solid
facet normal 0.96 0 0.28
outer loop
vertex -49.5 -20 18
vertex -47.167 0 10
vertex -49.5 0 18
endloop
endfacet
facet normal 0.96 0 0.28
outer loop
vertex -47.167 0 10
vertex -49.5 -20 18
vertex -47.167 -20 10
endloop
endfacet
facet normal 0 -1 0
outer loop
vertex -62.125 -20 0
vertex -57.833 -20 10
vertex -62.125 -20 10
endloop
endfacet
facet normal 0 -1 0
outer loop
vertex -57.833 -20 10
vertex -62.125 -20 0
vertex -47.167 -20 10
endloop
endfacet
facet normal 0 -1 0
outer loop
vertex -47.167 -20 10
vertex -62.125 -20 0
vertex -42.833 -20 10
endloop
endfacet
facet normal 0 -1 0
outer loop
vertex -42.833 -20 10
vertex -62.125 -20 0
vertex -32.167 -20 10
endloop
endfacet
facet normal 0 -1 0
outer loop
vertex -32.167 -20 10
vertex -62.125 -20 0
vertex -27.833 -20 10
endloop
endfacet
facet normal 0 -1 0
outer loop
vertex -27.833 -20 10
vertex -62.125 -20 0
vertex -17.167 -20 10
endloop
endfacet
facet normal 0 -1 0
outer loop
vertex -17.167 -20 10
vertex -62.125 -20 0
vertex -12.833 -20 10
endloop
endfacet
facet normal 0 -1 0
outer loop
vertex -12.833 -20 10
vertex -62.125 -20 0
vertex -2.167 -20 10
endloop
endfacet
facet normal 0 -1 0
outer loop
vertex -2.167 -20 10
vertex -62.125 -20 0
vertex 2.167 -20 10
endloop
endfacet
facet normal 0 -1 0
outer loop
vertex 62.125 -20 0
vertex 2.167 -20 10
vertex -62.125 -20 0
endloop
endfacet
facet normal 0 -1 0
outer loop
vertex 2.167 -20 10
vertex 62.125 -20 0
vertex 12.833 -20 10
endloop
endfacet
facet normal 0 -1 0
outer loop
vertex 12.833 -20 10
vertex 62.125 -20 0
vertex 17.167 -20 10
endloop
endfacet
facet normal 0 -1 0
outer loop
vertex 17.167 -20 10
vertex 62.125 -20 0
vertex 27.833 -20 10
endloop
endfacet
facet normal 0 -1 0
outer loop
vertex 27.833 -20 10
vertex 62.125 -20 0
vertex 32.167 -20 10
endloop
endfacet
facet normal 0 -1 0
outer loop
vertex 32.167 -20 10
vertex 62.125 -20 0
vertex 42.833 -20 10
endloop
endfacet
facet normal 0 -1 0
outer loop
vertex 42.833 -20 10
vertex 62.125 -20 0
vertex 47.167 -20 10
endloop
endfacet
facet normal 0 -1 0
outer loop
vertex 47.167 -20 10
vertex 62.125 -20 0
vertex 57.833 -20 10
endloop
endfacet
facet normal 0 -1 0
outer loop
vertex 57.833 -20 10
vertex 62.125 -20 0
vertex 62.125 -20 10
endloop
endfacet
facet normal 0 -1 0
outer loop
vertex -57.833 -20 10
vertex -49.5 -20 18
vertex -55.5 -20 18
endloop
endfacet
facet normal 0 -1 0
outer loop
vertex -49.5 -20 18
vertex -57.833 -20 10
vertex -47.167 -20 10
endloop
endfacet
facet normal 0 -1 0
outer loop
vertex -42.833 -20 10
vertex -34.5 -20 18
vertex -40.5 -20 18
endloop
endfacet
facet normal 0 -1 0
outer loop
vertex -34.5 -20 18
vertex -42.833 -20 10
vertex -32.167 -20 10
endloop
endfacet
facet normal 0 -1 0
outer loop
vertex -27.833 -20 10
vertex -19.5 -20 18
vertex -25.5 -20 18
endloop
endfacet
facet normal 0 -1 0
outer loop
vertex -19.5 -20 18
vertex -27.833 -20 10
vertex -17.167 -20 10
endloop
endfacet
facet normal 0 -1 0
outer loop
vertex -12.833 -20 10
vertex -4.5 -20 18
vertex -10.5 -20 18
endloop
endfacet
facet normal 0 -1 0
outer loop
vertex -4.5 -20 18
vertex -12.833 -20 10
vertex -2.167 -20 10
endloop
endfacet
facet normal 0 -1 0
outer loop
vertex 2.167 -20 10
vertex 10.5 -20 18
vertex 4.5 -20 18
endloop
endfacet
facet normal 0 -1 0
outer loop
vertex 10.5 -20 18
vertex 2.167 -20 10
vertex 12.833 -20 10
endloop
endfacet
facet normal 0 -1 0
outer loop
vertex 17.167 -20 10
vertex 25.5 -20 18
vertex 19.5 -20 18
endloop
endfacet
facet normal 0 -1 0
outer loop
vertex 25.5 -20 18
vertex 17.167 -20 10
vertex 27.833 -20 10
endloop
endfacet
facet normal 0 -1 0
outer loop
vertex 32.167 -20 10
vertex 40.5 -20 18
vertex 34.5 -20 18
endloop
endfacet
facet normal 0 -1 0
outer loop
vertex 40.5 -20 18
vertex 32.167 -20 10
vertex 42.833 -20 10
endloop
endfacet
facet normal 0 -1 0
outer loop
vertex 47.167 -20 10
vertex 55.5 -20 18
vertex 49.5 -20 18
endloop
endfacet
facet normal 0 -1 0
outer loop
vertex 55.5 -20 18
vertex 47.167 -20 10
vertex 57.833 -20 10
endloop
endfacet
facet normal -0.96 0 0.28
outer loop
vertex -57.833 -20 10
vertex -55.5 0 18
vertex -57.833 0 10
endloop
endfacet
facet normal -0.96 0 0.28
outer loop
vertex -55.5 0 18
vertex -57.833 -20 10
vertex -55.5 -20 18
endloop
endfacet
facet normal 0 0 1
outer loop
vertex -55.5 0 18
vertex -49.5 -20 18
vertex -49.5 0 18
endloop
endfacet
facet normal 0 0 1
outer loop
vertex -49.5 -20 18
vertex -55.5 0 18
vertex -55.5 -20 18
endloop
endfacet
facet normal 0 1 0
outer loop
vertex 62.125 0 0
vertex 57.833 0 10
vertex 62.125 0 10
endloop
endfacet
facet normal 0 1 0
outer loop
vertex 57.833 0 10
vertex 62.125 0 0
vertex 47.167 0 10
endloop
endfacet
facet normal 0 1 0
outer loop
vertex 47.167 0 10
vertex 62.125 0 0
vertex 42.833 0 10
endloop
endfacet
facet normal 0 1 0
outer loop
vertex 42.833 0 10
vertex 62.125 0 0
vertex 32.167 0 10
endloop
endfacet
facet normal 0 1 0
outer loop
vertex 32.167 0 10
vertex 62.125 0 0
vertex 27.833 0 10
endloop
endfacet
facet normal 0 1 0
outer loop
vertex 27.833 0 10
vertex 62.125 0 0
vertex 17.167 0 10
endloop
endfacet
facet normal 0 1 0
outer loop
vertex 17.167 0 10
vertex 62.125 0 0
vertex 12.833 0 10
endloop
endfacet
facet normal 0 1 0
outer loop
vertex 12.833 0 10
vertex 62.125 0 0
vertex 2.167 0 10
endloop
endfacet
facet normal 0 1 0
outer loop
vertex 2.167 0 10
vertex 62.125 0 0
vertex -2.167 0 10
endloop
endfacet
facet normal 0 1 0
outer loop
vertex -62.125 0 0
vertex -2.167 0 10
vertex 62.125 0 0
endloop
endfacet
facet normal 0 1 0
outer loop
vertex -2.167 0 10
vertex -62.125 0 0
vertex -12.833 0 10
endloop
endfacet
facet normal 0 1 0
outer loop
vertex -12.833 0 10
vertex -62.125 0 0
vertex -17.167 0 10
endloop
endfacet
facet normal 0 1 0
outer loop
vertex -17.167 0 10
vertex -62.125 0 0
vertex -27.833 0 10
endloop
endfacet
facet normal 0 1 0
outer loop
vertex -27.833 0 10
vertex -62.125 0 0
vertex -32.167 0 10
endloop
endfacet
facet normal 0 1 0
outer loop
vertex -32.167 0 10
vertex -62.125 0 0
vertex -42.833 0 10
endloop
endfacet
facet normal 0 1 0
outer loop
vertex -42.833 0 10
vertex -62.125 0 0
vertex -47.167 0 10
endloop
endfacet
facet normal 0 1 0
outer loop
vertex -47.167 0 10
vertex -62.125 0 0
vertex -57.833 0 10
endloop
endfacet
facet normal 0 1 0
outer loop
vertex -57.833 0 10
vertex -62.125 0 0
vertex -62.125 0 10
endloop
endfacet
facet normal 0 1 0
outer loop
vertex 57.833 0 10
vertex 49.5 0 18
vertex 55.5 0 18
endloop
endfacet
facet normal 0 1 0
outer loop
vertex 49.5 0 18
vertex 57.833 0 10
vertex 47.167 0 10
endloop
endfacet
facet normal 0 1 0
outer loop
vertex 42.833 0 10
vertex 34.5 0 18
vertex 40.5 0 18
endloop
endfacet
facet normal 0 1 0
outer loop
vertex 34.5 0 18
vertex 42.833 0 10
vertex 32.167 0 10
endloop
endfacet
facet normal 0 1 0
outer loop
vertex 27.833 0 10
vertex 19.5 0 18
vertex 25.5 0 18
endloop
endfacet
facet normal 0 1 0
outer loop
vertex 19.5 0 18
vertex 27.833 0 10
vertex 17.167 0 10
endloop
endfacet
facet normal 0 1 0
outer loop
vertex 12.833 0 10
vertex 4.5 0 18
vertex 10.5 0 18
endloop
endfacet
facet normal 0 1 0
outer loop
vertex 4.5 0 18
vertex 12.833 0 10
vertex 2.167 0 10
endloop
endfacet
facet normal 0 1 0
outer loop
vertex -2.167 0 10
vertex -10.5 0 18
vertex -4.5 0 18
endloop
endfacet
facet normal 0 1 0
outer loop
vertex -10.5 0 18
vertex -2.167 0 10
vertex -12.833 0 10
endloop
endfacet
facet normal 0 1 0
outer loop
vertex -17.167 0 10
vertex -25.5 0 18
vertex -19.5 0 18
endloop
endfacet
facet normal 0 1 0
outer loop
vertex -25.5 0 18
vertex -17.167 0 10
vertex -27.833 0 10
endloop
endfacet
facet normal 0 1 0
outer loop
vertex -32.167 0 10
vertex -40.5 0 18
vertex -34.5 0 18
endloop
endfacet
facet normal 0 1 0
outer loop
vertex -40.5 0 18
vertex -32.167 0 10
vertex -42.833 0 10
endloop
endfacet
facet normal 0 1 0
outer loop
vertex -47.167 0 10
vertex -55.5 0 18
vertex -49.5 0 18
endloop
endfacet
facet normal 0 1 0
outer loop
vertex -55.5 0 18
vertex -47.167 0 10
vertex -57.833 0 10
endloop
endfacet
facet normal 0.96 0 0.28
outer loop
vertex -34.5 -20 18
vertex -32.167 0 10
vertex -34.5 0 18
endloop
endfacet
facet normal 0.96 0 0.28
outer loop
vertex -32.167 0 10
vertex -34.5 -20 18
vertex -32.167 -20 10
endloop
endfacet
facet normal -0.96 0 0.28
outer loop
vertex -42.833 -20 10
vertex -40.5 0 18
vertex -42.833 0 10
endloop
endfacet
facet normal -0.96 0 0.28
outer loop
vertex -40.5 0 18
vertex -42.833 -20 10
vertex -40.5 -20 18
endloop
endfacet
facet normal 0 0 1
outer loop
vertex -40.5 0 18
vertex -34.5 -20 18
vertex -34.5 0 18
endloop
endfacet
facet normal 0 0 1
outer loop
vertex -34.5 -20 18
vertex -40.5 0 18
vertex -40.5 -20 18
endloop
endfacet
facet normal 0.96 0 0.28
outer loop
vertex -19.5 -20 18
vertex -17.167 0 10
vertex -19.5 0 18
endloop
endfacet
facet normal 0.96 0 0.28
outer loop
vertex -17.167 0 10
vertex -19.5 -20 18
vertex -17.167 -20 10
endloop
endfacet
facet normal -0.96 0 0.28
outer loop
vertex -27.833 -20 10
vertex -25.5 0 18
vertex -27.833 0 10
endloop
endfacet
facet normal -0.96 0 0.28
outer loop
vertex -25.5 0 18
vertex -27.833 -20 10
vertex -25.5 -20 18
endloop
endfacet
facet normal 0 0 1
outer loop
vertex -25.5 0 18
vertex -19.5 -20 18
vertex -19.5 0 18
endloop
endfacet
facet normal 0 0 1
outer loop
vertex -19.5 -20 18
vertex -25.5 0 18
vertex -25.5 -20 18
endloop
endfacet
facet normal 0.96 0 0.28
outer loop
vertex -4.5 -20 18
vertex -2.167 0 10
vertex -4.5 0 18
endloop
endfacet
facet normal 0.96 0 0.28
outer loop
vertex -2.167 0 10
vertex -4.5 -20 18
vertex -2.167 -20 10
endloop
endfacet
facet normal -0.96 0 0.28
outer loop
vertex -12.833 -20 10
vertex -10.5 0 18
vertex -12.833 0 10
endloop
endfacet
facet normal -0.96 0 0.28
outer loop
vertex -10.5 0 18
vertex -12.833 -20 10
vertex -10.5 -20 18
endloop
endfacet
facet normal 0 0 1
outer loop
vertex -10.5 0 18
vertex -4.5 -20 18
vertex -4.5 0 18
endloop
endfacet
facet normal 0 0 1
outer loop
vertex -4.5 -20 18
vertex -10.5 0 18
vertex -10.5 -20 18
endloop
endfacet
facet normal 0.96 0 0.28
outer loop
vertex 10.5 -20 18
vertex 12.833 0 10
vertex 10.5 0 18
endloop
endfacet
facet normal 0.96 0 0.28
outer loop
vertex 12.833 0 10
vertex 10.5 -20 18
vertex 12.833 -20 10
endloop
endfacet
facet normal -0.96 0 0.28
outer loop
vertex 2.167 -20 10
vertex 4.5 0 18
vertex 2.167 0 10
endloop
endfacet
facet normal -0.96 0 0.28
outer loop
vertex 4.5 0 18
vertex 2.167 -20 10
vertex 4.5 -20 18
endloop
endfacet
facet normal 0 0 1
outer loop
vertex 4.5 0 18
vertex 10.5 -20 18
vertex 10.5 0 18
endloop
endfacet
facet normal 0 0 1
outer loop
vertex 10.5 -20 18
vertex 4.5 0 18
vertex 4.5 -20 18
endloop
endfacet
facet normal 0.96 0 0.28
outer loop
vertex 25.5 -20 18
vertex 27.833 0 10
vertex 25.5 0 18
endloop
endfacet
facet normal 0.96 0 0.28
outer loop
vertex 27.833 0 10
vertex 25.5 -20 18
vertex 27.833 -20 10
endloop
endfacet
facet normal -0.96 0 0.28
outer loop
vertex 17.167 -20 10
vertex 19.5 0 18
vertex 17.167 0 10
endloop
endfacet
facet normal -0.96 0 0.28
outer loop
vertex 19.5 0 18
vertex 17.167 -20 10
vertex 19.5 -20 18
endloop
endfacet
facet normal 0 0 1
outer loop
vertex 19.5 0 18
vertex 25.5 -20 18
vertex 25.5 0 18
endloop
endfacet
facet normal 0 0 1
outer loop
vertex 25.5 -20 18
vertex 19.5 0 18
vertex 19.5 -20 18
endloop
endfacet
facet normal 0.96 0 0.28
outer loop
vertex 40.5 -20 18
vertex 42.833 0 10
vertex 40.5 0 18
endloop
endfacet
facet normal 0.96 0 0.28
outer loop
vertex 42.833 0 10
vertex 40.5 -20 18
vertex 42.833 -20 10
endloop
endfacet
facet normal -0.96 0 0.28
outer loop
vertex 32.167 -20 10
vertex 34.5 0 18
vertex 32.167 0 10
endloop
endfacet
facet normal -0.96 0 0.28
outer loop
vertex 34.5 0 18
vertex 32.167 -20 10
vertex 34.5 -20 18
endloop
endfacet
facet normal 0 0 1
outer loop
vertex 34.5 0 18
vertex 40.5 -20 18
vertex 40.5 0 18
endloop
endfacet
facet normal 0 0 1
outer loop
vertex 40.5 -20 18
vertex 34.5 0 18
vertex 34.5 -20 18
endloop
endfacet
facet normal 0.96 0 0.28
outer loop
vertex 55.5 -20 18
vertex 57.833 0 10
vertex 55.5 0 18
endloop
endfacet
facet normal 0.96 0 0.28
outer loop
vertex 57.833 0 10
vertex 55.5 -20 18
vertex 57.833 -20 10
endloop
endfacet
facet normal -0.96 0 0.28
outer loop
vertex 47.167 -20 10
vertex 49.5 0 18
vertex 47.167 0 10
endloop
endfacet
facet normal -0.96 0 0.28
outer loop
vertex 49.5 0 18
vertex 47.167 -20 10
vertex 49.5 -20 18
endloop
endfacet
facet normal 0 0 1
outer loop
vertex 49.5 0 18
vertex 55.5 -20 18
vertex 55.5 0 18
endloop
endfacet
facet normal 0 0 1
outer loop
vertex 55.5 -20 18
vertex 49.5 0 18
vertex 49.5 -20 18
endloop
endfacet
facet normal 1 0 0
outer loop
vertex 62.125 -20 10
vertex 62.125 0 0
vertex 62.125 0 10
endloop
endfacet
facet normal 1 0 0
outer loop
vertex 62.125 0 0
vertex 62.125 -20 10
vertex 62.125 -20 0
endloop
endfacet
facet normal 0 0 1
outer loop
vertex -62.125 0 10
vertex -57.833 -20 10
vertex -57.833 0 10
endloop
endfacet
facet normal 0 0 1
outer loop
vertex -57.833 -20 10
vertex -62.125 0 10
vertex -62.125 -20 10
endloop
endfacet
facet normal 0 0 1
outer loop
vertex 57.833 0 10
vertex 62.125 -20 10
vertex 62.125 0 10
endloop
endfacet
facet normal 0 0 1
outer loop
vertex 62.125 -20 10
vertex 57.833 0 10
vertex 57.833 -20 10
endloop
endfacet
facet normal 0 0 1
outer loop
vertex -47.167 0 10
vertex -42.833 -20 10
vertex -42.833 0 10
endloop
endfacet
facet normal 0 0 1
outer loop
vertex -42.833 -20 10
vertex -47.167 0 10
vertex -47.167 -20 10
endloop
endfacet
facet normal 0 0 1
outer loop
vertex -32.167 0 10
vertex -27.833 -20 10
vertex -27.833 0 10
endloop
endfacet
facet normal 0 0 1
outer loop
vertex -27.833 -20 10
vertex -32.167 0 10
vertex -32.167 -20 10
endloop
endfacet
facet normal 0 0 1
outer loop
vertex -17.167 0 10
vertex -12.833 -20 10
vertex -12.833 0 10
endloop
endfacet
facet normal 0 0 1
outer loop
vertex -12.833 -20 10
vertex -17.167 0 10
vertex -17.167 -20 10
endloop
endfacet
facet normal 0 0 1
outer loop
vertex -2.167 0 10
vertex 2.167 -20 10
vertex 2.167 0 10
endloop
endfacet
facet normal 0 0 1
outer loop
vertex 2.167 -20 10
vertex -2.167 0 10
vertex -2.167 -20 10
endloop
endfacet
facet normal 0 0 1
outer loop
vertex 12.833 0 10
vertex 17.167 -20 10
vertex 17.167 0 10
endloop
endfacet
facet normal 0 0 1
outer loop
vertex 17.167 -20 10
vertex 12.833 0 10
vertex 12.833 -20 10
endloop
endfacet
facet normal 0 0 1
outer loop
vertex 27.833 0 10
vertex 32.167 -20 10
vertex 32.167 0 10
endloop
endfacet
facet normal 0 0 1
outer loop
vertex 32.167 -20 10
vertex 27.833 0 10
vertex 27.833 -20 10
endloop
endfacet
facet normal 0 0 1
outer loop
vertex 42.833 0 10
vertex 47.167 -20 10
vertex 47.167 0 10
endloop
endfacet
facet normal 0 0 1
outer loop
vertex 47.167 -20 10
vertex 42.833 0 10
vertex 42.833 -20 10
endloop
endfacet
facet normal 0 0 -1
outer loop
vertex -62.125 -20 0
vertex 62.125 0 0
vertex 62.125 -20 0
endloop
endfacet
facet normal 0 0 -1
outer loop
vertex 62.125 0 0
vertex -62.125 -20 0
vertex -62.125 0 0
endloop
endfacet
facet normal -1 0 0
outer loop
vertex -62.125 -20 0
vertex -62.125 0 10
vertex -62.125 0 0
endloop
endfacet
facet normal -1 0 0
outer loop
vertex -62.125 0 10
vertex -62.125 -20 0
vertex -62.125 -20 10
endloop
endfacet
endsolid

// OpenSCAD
$fn = 32;

// ----------------------------------------------------------------------
// Toothed rack, 8 teeth
// 15 mm pitch, 8 mm teeth
// ----------------------------------------------------------------------

// --- parameters (mm) ---
bar_w = 20;      // bar width (Y)
bar_h = 10;      // bar height (Z)
teeth = 8;       // number of teeth
pitch = 15;      // tooth pitch
tooth_h = 8;     // tooth height above the bar
root_w = 11.25;  // tooth width at the root
crest_w = 6;     // tooth width at the crest

// --- derived feature positions (mm) ---
span = (teeth - 1) * pitch;  // = 105   distance between the outer teeth
bar_l = span + root_w + 8;   // = 124.25   bar length: teeth plus 4 mm at each end
tooth_x = -span / 2;         // = -52.5   X of the first tooth
height = bar_h + tooth_h;    // = 18   overall height
feature_centers = [
  [tooth_x + 0 * pitch, -bar_w / 2],
  [tooth_x + 1 * pitch, -bar_w / 2],
  [tooth_x + 2 * pitch, -bar_w / 2],
  [tooth_x + 3 * pitch, -bar_w / 2],
  [tooth_x + 4 * pitch, -bar_w / 2],
  [tooth_x + 5 * pitch, -bar_w / 2],
  [tooth_x + 6 * pitch, -bar_w / 2],
  [tooth_x + 7 * pitch, -bar_w / 2]
];   // tooth centre line, drives the tooth loop

// bar with a rack of teeth, one extruded trapezoium per centre
module rack_tooth() {
  linear_extrude(height = bar_w)
    polygon(points = [
      [0, 0],
      [root_w, 0],
      [root_w / 2 + crest_w / 2, tooth_h + 1],
      [root_w / 2 - crest_w / 2, tooth_h + 1]
    ]);
}

union() {
  translate([-bar_l / 2, -bar_w, 0]) cube([bar_l, bar_w, bar_h]);
  for (centre = feature_centers)
    translate([centre[0] - root_w / 2, 0, bar_h - 1]) rotate([90, 0, 0]) rack_tooth();
}
